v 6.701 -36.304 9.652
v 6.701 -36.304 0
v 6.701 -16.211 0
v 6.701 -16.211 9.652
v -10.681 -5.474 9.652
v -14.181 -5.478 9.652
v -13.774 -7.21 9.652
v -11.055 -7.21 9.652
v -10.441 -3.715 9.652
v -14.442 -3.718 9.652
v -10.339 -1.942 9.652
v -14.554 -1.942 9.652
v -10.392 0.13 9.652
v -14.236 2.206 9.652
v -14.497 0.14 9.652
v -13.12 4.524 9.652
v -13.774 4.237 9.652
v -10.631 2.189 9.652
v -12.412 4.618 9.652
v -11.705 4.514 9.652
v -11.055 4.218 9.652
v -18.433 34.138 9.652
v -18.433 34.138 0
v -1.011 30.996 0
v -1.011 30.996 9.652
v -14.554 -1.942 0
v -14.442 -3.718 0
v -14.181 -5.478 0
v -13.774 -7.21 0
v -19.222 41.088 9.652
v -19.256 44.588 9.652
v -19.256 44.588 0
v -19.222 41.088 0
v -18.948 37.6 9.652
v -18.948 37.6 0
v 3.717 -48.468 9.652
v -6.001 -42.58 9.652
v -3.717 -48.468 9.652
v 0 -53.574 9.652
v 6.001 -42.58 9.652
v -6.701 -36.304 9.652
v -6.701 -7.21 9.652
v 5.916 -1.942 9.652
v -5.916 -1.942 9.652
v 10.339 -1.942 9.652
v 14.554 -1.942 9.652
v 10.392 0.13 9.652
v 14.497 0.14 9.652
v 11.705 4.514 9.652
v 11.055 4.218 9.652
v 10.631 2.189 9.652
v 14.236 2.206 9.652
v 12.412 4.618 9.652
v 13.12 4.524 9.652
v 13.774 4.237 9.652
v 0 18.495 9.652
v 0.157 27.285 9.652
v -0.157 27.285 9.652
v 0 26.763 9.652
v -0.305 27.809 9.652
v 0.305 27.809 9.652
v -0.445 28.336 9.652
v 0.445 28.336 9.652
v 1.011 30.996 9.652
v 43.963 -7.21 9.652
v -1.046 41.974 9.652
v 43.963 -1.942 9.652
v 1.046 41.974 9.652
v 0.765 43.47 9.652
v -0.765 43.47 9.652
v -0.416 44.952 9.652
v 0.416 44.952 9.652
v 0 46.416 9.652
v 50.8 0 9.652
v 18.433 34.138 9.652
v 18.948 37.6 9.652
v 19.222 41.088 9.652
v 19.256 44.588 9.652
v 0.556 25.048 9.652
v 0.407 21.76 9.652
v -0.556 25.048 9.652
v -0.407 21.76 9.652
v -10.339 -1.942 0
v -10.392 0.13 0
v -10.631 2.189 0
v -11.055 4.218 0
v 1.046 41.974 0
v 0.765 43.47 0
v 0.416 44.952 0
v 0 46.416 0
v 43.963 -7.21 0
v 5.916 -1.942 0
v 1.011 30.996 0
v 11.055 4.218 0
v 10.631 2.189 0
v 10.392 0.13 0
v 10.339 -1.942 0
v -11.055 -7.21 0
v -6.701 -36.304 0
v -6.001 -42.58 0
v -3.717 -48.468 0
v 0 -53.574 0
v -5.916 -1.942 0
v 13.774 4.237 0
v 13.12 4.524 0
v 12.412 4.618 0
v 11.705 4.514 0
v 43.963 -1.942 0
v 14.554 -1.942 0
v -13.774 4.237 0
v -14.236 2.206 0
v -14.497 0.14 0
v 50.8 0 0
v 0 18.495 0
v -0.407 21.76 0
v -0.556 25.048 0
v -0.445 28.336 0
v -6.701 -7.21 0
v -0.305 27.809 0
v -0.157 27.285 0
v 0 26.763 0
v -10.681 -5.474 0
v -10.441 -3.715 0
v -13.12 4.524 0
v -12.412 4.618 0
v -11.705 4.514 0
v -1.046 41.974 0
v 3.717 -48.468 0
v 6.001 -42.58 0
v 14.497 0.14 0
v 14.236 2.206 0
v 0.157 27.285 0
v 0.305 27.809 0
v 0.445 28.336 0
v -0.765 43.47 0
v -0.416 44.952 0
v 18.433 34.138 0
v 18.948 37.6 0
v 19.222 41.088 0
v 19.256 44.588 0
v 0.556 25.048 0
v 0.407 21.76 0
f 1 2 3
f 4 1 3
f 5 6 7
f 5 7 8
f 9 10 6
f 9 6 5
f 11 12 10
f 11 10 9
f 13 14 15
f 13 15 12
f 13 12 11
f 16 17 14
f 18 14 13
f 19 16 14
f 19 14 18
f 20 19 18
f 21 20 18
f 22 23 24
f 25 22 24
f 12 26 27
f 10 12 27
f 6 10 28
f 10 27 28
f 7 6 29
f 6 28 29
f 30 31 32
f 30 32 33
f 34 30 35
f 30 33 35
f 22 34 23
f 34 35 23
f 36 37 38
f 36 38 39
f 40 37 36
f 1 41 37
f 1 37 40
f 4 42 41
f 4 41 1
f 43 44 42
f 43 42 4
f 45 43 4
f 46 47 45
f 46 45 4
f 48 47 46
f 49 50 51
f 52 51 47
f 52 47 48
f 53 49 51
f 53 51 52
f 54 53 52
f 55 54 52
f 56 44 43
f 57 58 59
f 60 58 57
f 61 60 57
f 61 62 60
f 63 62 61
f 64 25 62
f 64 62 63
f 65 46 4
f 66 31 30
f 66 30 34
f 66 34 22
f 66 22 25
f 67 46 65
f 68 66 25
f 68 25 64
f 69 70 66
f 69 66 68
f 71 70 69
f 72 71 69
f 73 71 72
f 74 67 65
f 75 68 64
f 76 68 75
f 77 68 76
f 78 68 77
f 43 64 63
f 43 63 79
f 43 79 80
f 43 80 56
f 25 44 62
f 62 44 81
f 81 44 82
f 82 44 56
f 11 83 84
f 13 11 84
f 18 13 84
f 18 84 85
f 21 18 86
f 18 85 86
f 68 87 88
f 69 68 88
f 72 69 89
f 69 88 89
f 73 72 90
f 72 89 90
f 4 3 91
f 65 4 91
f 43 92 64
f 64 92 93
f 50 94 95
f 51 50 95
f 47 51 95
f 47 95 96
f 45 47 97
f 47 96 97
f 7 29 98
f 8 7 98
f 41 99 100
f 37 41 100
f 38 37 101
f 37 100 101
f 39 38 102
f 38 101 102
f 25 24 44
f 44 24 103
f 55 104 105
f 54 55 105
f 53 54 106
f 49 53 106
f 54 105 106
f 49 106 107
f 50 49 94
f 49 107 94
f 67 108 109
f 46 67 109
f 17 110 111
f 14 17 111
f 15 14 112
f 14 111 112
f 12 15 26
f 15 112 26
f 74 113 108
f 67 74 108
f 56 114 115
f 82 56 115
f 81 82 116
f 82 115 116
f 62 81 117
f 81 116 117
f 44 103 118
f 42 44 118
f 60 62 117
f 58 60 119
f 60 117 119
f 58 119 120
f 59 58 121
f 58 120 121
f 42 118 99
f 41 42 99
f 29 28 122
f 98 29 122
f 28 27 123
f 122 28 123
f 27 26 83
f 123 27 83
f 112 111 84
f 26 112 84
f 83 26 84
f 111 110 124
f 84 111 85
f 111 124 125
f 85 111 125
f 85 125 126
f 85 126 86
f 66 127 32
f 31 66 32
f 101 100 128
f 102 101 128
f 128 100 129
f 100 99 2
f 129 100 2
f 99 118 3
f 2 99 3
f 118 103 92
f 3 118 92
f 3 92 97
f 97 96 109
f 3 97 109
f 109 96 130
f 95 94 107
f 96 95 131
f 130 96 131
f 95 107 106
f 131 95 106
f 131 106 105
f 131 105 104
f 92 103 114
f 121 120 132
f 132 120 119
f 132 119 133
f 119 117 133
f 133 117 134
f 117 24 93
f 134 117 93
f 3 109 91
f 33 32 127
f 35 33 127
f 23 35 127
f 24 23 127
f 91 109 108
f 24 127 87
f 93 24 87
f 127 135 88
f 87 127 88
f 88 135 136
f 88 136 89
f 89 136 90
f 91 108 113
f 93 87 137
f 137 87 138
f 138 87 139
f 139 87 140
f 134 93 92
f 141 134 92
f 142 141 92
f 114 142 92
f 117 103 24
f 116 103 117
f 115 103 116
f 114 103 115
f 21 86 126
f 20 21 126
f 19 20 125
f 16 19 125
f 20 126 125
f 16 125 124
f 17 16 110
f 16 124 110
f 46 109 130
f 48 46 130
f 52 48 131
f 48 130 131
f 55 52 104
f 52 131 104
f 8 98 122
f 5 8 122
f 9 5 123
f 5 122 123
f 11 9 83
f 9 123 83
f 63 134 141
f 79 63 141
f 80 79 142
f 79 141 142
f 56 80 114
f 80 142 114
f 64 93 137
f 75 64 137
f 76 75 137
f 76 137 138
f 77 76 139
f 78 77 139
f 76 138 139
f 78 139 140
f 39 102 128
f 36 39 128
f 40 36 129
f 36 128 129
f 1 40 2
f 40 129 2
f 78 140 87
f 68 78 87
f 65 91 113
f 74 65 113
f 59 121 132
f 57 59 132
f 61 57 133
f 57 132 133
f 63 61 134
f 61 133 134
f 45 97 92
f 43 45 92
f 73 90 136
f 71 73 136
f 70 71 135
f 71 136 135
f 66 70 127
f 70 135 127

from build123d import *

# Parameters (mm, degrees)
F1_DEPTH = 9.652


with BuildPart() as f1:
    # F0 (on Top) → F1 (new body)
    with BuildSketch(Plane.XY):
        with BuildLine():
            Line((-6.700701, -16.211178), (-6.700701, -36.303711))
            ThreePointArc((-6.700701, -36.303711), (-5.050182, -45.598572), (0, -53.574432))
            ThreePointArc((0, -53.574432), (5.050182, -45.598572), (6.700701, -36.303711))
            Line((6.700701, -36.303711), (6.700701, -16.211178))
            Line((6.700701, -16.211178), (6.700701, -7.210088))
            Line((6.700701, -7.210088), (5.916144, -1.941705))
            Line((5.916144, -1.941705), (1.011126, 30.996017))
            ThreePointArc((1.011126, 30.996017), (0.755044, 29.660392), (0.44457, 28.336354))
            ThreePointArc((0.44457, 28.336354), (0.514056, 23.402501), (0, 18.49501))
            ThreePointArc((0, 18.49501), (-0.514056, 23.402501), (-0.44457, 28.336354))
            ThreePointArc((-0.44457, 28.336354), (-0.755044, 29.660392), (-1.011126, 30.996017))
            Line((-1.011126, 30.996017), (-5.916144, -1.941705))
            Line((-5.916144, -1.941705), (-6.700701, -7.210088))
            Line((-6.700701, -7.210088), (-6.700701, -16.211178))
        make_face()
        with BuildLine():
            ThreePointArc((-11.054505, -7.210088), (-10.544003, -4.596626), (-10.338607, -1.941705))
            ThreePointArc((-10.338607, -1.941705), (-10.488245, 1.162568), (-11.054505, 4.218423))
            ThreePointArc((-11.054505, 4.218423), (-12.411724, 4.618153), (-13.774321, 4.237153))
            ThreePointArc((-13.774321, 4.237153), (-14.391497, 1.176412), (-14.55396, -1.941705))
            ThreePointArc((-14.55396, -1.941705), (-14.329674, -4.600393), (-13.774321, -7.210088))
            Line((-13.774321, -7.210088), (-11.054505, -7.210088))
        make_face()
        with BuildLine():
            Line((6.700701, -7.210088), (6.700701, -16.211178))
            Line((6.700701, -16.211178), (43.963221, -7.210088))
            Line((43.963221, -7.210088), (50.799912, 0))
            Line((50.799912, 0), (43.963221, -1.941705))
            Line((43.963221, -1.941705), (14.55396, -1.941705))
            ThreePointArc((14.55396, -1.941705), (14.329674, -4.600393), (13.774321, -7.210088))
            Line((13.774321, -7.210088), (11.054505, -7.210088))
            ThreePointArc((11.054505, -7.210088), (10.544003, -4.596626), (10.338607, -1.941705))
            Line((10.338607, -1.941705), (5.916144, -1.941705))
            Line((5.916144, -1.941705), (6.700701, -7.210088))
        make_face()
        with BuildLine():
            Line((-18.433218, 34.138091), (-1.011126, 30.996017))
            ThreePointArc((-1.011126, 30.996017), (-1.484671, 36.483617), (-1.045989, 41.974113))
            Line((-1.045989, 41.974113), (-19.255532, 44.58786))
            ThreePointArc((-19.255532, 44.58786), (-19.115233, 39.341661), (-18.433218, 34.138091))
        make_face()
        with BuildLine():
            ThreePointArc((-1.045989, 41.974113), (-1.484671, 36.483617), (-1.011126, 30.996017))
            ThreePointArc((-1.011126, 30.996017), (-0.755044, 29.660392), (-0.44457, 28.336354))
            ThreePointArc((-0.44457, 28.336354), (-0.231957, 27.546877), (0, 26.762867))
            ThreePointArc((0, 26.762867), (0.231957, 27.546877), (0.44457, 28.336354))
            ThreePointArc((0.44457, 28.336354), (0.755044, 29.660392), (1.011126, 30.996017))
            ThreePointArc((1.011126, 30.996017), (1.484671, 36.483617), (1.045989, 41.974113))
            ThreePointArc((1.045989, 41.974113), (0.599258, 44.212814), (0, 46.415593))
            ThreePointArc((0, 46.415593), (-0.599258, 44.212814), (-1.045989, 41.974113))
        make_face()
        with BuildLine():
            ThreePointArc((1.045989, 41.974113), (1.484671, 36.483617), (1.011126, 30.996017))
            Line((1.011126, 30.996017), (18.433218, 34.138091))
            ThreePointArc((18.433218, 34.138091), (19.115233, 39.341661), (19.255532, 44.58786))
            Line((19.255532, 44.58786), (1.045989, 41.974113))
        make_face()
        with BuildLine():
            ThreePointArc((11.054505, 4.218423), (10.488245, 1.162568), (10.338607, -1.941705))
            ThreePointArc((10.338607, -1.941705), (10.544003, -4.596626), (11.054505, -7.210088))
            Line((11.054505, -7.210088), (13.774321, -7.210088))
            ThreePointArc((13.774321, -7.210088), (14.329674, -4.600393), (14.55396, -1.941705))
            ThreePointArc((14.55396, -1.941705), (14.391497, 1.176412), (13.774321, 4.237153))
            ThreePointArc((13.774321, 4.237153), (12.411724, 4.618153), (11.054505, 4.218423))
        make_face()
    extrude(amount=F1_DEPTH)


solid = f1.part
